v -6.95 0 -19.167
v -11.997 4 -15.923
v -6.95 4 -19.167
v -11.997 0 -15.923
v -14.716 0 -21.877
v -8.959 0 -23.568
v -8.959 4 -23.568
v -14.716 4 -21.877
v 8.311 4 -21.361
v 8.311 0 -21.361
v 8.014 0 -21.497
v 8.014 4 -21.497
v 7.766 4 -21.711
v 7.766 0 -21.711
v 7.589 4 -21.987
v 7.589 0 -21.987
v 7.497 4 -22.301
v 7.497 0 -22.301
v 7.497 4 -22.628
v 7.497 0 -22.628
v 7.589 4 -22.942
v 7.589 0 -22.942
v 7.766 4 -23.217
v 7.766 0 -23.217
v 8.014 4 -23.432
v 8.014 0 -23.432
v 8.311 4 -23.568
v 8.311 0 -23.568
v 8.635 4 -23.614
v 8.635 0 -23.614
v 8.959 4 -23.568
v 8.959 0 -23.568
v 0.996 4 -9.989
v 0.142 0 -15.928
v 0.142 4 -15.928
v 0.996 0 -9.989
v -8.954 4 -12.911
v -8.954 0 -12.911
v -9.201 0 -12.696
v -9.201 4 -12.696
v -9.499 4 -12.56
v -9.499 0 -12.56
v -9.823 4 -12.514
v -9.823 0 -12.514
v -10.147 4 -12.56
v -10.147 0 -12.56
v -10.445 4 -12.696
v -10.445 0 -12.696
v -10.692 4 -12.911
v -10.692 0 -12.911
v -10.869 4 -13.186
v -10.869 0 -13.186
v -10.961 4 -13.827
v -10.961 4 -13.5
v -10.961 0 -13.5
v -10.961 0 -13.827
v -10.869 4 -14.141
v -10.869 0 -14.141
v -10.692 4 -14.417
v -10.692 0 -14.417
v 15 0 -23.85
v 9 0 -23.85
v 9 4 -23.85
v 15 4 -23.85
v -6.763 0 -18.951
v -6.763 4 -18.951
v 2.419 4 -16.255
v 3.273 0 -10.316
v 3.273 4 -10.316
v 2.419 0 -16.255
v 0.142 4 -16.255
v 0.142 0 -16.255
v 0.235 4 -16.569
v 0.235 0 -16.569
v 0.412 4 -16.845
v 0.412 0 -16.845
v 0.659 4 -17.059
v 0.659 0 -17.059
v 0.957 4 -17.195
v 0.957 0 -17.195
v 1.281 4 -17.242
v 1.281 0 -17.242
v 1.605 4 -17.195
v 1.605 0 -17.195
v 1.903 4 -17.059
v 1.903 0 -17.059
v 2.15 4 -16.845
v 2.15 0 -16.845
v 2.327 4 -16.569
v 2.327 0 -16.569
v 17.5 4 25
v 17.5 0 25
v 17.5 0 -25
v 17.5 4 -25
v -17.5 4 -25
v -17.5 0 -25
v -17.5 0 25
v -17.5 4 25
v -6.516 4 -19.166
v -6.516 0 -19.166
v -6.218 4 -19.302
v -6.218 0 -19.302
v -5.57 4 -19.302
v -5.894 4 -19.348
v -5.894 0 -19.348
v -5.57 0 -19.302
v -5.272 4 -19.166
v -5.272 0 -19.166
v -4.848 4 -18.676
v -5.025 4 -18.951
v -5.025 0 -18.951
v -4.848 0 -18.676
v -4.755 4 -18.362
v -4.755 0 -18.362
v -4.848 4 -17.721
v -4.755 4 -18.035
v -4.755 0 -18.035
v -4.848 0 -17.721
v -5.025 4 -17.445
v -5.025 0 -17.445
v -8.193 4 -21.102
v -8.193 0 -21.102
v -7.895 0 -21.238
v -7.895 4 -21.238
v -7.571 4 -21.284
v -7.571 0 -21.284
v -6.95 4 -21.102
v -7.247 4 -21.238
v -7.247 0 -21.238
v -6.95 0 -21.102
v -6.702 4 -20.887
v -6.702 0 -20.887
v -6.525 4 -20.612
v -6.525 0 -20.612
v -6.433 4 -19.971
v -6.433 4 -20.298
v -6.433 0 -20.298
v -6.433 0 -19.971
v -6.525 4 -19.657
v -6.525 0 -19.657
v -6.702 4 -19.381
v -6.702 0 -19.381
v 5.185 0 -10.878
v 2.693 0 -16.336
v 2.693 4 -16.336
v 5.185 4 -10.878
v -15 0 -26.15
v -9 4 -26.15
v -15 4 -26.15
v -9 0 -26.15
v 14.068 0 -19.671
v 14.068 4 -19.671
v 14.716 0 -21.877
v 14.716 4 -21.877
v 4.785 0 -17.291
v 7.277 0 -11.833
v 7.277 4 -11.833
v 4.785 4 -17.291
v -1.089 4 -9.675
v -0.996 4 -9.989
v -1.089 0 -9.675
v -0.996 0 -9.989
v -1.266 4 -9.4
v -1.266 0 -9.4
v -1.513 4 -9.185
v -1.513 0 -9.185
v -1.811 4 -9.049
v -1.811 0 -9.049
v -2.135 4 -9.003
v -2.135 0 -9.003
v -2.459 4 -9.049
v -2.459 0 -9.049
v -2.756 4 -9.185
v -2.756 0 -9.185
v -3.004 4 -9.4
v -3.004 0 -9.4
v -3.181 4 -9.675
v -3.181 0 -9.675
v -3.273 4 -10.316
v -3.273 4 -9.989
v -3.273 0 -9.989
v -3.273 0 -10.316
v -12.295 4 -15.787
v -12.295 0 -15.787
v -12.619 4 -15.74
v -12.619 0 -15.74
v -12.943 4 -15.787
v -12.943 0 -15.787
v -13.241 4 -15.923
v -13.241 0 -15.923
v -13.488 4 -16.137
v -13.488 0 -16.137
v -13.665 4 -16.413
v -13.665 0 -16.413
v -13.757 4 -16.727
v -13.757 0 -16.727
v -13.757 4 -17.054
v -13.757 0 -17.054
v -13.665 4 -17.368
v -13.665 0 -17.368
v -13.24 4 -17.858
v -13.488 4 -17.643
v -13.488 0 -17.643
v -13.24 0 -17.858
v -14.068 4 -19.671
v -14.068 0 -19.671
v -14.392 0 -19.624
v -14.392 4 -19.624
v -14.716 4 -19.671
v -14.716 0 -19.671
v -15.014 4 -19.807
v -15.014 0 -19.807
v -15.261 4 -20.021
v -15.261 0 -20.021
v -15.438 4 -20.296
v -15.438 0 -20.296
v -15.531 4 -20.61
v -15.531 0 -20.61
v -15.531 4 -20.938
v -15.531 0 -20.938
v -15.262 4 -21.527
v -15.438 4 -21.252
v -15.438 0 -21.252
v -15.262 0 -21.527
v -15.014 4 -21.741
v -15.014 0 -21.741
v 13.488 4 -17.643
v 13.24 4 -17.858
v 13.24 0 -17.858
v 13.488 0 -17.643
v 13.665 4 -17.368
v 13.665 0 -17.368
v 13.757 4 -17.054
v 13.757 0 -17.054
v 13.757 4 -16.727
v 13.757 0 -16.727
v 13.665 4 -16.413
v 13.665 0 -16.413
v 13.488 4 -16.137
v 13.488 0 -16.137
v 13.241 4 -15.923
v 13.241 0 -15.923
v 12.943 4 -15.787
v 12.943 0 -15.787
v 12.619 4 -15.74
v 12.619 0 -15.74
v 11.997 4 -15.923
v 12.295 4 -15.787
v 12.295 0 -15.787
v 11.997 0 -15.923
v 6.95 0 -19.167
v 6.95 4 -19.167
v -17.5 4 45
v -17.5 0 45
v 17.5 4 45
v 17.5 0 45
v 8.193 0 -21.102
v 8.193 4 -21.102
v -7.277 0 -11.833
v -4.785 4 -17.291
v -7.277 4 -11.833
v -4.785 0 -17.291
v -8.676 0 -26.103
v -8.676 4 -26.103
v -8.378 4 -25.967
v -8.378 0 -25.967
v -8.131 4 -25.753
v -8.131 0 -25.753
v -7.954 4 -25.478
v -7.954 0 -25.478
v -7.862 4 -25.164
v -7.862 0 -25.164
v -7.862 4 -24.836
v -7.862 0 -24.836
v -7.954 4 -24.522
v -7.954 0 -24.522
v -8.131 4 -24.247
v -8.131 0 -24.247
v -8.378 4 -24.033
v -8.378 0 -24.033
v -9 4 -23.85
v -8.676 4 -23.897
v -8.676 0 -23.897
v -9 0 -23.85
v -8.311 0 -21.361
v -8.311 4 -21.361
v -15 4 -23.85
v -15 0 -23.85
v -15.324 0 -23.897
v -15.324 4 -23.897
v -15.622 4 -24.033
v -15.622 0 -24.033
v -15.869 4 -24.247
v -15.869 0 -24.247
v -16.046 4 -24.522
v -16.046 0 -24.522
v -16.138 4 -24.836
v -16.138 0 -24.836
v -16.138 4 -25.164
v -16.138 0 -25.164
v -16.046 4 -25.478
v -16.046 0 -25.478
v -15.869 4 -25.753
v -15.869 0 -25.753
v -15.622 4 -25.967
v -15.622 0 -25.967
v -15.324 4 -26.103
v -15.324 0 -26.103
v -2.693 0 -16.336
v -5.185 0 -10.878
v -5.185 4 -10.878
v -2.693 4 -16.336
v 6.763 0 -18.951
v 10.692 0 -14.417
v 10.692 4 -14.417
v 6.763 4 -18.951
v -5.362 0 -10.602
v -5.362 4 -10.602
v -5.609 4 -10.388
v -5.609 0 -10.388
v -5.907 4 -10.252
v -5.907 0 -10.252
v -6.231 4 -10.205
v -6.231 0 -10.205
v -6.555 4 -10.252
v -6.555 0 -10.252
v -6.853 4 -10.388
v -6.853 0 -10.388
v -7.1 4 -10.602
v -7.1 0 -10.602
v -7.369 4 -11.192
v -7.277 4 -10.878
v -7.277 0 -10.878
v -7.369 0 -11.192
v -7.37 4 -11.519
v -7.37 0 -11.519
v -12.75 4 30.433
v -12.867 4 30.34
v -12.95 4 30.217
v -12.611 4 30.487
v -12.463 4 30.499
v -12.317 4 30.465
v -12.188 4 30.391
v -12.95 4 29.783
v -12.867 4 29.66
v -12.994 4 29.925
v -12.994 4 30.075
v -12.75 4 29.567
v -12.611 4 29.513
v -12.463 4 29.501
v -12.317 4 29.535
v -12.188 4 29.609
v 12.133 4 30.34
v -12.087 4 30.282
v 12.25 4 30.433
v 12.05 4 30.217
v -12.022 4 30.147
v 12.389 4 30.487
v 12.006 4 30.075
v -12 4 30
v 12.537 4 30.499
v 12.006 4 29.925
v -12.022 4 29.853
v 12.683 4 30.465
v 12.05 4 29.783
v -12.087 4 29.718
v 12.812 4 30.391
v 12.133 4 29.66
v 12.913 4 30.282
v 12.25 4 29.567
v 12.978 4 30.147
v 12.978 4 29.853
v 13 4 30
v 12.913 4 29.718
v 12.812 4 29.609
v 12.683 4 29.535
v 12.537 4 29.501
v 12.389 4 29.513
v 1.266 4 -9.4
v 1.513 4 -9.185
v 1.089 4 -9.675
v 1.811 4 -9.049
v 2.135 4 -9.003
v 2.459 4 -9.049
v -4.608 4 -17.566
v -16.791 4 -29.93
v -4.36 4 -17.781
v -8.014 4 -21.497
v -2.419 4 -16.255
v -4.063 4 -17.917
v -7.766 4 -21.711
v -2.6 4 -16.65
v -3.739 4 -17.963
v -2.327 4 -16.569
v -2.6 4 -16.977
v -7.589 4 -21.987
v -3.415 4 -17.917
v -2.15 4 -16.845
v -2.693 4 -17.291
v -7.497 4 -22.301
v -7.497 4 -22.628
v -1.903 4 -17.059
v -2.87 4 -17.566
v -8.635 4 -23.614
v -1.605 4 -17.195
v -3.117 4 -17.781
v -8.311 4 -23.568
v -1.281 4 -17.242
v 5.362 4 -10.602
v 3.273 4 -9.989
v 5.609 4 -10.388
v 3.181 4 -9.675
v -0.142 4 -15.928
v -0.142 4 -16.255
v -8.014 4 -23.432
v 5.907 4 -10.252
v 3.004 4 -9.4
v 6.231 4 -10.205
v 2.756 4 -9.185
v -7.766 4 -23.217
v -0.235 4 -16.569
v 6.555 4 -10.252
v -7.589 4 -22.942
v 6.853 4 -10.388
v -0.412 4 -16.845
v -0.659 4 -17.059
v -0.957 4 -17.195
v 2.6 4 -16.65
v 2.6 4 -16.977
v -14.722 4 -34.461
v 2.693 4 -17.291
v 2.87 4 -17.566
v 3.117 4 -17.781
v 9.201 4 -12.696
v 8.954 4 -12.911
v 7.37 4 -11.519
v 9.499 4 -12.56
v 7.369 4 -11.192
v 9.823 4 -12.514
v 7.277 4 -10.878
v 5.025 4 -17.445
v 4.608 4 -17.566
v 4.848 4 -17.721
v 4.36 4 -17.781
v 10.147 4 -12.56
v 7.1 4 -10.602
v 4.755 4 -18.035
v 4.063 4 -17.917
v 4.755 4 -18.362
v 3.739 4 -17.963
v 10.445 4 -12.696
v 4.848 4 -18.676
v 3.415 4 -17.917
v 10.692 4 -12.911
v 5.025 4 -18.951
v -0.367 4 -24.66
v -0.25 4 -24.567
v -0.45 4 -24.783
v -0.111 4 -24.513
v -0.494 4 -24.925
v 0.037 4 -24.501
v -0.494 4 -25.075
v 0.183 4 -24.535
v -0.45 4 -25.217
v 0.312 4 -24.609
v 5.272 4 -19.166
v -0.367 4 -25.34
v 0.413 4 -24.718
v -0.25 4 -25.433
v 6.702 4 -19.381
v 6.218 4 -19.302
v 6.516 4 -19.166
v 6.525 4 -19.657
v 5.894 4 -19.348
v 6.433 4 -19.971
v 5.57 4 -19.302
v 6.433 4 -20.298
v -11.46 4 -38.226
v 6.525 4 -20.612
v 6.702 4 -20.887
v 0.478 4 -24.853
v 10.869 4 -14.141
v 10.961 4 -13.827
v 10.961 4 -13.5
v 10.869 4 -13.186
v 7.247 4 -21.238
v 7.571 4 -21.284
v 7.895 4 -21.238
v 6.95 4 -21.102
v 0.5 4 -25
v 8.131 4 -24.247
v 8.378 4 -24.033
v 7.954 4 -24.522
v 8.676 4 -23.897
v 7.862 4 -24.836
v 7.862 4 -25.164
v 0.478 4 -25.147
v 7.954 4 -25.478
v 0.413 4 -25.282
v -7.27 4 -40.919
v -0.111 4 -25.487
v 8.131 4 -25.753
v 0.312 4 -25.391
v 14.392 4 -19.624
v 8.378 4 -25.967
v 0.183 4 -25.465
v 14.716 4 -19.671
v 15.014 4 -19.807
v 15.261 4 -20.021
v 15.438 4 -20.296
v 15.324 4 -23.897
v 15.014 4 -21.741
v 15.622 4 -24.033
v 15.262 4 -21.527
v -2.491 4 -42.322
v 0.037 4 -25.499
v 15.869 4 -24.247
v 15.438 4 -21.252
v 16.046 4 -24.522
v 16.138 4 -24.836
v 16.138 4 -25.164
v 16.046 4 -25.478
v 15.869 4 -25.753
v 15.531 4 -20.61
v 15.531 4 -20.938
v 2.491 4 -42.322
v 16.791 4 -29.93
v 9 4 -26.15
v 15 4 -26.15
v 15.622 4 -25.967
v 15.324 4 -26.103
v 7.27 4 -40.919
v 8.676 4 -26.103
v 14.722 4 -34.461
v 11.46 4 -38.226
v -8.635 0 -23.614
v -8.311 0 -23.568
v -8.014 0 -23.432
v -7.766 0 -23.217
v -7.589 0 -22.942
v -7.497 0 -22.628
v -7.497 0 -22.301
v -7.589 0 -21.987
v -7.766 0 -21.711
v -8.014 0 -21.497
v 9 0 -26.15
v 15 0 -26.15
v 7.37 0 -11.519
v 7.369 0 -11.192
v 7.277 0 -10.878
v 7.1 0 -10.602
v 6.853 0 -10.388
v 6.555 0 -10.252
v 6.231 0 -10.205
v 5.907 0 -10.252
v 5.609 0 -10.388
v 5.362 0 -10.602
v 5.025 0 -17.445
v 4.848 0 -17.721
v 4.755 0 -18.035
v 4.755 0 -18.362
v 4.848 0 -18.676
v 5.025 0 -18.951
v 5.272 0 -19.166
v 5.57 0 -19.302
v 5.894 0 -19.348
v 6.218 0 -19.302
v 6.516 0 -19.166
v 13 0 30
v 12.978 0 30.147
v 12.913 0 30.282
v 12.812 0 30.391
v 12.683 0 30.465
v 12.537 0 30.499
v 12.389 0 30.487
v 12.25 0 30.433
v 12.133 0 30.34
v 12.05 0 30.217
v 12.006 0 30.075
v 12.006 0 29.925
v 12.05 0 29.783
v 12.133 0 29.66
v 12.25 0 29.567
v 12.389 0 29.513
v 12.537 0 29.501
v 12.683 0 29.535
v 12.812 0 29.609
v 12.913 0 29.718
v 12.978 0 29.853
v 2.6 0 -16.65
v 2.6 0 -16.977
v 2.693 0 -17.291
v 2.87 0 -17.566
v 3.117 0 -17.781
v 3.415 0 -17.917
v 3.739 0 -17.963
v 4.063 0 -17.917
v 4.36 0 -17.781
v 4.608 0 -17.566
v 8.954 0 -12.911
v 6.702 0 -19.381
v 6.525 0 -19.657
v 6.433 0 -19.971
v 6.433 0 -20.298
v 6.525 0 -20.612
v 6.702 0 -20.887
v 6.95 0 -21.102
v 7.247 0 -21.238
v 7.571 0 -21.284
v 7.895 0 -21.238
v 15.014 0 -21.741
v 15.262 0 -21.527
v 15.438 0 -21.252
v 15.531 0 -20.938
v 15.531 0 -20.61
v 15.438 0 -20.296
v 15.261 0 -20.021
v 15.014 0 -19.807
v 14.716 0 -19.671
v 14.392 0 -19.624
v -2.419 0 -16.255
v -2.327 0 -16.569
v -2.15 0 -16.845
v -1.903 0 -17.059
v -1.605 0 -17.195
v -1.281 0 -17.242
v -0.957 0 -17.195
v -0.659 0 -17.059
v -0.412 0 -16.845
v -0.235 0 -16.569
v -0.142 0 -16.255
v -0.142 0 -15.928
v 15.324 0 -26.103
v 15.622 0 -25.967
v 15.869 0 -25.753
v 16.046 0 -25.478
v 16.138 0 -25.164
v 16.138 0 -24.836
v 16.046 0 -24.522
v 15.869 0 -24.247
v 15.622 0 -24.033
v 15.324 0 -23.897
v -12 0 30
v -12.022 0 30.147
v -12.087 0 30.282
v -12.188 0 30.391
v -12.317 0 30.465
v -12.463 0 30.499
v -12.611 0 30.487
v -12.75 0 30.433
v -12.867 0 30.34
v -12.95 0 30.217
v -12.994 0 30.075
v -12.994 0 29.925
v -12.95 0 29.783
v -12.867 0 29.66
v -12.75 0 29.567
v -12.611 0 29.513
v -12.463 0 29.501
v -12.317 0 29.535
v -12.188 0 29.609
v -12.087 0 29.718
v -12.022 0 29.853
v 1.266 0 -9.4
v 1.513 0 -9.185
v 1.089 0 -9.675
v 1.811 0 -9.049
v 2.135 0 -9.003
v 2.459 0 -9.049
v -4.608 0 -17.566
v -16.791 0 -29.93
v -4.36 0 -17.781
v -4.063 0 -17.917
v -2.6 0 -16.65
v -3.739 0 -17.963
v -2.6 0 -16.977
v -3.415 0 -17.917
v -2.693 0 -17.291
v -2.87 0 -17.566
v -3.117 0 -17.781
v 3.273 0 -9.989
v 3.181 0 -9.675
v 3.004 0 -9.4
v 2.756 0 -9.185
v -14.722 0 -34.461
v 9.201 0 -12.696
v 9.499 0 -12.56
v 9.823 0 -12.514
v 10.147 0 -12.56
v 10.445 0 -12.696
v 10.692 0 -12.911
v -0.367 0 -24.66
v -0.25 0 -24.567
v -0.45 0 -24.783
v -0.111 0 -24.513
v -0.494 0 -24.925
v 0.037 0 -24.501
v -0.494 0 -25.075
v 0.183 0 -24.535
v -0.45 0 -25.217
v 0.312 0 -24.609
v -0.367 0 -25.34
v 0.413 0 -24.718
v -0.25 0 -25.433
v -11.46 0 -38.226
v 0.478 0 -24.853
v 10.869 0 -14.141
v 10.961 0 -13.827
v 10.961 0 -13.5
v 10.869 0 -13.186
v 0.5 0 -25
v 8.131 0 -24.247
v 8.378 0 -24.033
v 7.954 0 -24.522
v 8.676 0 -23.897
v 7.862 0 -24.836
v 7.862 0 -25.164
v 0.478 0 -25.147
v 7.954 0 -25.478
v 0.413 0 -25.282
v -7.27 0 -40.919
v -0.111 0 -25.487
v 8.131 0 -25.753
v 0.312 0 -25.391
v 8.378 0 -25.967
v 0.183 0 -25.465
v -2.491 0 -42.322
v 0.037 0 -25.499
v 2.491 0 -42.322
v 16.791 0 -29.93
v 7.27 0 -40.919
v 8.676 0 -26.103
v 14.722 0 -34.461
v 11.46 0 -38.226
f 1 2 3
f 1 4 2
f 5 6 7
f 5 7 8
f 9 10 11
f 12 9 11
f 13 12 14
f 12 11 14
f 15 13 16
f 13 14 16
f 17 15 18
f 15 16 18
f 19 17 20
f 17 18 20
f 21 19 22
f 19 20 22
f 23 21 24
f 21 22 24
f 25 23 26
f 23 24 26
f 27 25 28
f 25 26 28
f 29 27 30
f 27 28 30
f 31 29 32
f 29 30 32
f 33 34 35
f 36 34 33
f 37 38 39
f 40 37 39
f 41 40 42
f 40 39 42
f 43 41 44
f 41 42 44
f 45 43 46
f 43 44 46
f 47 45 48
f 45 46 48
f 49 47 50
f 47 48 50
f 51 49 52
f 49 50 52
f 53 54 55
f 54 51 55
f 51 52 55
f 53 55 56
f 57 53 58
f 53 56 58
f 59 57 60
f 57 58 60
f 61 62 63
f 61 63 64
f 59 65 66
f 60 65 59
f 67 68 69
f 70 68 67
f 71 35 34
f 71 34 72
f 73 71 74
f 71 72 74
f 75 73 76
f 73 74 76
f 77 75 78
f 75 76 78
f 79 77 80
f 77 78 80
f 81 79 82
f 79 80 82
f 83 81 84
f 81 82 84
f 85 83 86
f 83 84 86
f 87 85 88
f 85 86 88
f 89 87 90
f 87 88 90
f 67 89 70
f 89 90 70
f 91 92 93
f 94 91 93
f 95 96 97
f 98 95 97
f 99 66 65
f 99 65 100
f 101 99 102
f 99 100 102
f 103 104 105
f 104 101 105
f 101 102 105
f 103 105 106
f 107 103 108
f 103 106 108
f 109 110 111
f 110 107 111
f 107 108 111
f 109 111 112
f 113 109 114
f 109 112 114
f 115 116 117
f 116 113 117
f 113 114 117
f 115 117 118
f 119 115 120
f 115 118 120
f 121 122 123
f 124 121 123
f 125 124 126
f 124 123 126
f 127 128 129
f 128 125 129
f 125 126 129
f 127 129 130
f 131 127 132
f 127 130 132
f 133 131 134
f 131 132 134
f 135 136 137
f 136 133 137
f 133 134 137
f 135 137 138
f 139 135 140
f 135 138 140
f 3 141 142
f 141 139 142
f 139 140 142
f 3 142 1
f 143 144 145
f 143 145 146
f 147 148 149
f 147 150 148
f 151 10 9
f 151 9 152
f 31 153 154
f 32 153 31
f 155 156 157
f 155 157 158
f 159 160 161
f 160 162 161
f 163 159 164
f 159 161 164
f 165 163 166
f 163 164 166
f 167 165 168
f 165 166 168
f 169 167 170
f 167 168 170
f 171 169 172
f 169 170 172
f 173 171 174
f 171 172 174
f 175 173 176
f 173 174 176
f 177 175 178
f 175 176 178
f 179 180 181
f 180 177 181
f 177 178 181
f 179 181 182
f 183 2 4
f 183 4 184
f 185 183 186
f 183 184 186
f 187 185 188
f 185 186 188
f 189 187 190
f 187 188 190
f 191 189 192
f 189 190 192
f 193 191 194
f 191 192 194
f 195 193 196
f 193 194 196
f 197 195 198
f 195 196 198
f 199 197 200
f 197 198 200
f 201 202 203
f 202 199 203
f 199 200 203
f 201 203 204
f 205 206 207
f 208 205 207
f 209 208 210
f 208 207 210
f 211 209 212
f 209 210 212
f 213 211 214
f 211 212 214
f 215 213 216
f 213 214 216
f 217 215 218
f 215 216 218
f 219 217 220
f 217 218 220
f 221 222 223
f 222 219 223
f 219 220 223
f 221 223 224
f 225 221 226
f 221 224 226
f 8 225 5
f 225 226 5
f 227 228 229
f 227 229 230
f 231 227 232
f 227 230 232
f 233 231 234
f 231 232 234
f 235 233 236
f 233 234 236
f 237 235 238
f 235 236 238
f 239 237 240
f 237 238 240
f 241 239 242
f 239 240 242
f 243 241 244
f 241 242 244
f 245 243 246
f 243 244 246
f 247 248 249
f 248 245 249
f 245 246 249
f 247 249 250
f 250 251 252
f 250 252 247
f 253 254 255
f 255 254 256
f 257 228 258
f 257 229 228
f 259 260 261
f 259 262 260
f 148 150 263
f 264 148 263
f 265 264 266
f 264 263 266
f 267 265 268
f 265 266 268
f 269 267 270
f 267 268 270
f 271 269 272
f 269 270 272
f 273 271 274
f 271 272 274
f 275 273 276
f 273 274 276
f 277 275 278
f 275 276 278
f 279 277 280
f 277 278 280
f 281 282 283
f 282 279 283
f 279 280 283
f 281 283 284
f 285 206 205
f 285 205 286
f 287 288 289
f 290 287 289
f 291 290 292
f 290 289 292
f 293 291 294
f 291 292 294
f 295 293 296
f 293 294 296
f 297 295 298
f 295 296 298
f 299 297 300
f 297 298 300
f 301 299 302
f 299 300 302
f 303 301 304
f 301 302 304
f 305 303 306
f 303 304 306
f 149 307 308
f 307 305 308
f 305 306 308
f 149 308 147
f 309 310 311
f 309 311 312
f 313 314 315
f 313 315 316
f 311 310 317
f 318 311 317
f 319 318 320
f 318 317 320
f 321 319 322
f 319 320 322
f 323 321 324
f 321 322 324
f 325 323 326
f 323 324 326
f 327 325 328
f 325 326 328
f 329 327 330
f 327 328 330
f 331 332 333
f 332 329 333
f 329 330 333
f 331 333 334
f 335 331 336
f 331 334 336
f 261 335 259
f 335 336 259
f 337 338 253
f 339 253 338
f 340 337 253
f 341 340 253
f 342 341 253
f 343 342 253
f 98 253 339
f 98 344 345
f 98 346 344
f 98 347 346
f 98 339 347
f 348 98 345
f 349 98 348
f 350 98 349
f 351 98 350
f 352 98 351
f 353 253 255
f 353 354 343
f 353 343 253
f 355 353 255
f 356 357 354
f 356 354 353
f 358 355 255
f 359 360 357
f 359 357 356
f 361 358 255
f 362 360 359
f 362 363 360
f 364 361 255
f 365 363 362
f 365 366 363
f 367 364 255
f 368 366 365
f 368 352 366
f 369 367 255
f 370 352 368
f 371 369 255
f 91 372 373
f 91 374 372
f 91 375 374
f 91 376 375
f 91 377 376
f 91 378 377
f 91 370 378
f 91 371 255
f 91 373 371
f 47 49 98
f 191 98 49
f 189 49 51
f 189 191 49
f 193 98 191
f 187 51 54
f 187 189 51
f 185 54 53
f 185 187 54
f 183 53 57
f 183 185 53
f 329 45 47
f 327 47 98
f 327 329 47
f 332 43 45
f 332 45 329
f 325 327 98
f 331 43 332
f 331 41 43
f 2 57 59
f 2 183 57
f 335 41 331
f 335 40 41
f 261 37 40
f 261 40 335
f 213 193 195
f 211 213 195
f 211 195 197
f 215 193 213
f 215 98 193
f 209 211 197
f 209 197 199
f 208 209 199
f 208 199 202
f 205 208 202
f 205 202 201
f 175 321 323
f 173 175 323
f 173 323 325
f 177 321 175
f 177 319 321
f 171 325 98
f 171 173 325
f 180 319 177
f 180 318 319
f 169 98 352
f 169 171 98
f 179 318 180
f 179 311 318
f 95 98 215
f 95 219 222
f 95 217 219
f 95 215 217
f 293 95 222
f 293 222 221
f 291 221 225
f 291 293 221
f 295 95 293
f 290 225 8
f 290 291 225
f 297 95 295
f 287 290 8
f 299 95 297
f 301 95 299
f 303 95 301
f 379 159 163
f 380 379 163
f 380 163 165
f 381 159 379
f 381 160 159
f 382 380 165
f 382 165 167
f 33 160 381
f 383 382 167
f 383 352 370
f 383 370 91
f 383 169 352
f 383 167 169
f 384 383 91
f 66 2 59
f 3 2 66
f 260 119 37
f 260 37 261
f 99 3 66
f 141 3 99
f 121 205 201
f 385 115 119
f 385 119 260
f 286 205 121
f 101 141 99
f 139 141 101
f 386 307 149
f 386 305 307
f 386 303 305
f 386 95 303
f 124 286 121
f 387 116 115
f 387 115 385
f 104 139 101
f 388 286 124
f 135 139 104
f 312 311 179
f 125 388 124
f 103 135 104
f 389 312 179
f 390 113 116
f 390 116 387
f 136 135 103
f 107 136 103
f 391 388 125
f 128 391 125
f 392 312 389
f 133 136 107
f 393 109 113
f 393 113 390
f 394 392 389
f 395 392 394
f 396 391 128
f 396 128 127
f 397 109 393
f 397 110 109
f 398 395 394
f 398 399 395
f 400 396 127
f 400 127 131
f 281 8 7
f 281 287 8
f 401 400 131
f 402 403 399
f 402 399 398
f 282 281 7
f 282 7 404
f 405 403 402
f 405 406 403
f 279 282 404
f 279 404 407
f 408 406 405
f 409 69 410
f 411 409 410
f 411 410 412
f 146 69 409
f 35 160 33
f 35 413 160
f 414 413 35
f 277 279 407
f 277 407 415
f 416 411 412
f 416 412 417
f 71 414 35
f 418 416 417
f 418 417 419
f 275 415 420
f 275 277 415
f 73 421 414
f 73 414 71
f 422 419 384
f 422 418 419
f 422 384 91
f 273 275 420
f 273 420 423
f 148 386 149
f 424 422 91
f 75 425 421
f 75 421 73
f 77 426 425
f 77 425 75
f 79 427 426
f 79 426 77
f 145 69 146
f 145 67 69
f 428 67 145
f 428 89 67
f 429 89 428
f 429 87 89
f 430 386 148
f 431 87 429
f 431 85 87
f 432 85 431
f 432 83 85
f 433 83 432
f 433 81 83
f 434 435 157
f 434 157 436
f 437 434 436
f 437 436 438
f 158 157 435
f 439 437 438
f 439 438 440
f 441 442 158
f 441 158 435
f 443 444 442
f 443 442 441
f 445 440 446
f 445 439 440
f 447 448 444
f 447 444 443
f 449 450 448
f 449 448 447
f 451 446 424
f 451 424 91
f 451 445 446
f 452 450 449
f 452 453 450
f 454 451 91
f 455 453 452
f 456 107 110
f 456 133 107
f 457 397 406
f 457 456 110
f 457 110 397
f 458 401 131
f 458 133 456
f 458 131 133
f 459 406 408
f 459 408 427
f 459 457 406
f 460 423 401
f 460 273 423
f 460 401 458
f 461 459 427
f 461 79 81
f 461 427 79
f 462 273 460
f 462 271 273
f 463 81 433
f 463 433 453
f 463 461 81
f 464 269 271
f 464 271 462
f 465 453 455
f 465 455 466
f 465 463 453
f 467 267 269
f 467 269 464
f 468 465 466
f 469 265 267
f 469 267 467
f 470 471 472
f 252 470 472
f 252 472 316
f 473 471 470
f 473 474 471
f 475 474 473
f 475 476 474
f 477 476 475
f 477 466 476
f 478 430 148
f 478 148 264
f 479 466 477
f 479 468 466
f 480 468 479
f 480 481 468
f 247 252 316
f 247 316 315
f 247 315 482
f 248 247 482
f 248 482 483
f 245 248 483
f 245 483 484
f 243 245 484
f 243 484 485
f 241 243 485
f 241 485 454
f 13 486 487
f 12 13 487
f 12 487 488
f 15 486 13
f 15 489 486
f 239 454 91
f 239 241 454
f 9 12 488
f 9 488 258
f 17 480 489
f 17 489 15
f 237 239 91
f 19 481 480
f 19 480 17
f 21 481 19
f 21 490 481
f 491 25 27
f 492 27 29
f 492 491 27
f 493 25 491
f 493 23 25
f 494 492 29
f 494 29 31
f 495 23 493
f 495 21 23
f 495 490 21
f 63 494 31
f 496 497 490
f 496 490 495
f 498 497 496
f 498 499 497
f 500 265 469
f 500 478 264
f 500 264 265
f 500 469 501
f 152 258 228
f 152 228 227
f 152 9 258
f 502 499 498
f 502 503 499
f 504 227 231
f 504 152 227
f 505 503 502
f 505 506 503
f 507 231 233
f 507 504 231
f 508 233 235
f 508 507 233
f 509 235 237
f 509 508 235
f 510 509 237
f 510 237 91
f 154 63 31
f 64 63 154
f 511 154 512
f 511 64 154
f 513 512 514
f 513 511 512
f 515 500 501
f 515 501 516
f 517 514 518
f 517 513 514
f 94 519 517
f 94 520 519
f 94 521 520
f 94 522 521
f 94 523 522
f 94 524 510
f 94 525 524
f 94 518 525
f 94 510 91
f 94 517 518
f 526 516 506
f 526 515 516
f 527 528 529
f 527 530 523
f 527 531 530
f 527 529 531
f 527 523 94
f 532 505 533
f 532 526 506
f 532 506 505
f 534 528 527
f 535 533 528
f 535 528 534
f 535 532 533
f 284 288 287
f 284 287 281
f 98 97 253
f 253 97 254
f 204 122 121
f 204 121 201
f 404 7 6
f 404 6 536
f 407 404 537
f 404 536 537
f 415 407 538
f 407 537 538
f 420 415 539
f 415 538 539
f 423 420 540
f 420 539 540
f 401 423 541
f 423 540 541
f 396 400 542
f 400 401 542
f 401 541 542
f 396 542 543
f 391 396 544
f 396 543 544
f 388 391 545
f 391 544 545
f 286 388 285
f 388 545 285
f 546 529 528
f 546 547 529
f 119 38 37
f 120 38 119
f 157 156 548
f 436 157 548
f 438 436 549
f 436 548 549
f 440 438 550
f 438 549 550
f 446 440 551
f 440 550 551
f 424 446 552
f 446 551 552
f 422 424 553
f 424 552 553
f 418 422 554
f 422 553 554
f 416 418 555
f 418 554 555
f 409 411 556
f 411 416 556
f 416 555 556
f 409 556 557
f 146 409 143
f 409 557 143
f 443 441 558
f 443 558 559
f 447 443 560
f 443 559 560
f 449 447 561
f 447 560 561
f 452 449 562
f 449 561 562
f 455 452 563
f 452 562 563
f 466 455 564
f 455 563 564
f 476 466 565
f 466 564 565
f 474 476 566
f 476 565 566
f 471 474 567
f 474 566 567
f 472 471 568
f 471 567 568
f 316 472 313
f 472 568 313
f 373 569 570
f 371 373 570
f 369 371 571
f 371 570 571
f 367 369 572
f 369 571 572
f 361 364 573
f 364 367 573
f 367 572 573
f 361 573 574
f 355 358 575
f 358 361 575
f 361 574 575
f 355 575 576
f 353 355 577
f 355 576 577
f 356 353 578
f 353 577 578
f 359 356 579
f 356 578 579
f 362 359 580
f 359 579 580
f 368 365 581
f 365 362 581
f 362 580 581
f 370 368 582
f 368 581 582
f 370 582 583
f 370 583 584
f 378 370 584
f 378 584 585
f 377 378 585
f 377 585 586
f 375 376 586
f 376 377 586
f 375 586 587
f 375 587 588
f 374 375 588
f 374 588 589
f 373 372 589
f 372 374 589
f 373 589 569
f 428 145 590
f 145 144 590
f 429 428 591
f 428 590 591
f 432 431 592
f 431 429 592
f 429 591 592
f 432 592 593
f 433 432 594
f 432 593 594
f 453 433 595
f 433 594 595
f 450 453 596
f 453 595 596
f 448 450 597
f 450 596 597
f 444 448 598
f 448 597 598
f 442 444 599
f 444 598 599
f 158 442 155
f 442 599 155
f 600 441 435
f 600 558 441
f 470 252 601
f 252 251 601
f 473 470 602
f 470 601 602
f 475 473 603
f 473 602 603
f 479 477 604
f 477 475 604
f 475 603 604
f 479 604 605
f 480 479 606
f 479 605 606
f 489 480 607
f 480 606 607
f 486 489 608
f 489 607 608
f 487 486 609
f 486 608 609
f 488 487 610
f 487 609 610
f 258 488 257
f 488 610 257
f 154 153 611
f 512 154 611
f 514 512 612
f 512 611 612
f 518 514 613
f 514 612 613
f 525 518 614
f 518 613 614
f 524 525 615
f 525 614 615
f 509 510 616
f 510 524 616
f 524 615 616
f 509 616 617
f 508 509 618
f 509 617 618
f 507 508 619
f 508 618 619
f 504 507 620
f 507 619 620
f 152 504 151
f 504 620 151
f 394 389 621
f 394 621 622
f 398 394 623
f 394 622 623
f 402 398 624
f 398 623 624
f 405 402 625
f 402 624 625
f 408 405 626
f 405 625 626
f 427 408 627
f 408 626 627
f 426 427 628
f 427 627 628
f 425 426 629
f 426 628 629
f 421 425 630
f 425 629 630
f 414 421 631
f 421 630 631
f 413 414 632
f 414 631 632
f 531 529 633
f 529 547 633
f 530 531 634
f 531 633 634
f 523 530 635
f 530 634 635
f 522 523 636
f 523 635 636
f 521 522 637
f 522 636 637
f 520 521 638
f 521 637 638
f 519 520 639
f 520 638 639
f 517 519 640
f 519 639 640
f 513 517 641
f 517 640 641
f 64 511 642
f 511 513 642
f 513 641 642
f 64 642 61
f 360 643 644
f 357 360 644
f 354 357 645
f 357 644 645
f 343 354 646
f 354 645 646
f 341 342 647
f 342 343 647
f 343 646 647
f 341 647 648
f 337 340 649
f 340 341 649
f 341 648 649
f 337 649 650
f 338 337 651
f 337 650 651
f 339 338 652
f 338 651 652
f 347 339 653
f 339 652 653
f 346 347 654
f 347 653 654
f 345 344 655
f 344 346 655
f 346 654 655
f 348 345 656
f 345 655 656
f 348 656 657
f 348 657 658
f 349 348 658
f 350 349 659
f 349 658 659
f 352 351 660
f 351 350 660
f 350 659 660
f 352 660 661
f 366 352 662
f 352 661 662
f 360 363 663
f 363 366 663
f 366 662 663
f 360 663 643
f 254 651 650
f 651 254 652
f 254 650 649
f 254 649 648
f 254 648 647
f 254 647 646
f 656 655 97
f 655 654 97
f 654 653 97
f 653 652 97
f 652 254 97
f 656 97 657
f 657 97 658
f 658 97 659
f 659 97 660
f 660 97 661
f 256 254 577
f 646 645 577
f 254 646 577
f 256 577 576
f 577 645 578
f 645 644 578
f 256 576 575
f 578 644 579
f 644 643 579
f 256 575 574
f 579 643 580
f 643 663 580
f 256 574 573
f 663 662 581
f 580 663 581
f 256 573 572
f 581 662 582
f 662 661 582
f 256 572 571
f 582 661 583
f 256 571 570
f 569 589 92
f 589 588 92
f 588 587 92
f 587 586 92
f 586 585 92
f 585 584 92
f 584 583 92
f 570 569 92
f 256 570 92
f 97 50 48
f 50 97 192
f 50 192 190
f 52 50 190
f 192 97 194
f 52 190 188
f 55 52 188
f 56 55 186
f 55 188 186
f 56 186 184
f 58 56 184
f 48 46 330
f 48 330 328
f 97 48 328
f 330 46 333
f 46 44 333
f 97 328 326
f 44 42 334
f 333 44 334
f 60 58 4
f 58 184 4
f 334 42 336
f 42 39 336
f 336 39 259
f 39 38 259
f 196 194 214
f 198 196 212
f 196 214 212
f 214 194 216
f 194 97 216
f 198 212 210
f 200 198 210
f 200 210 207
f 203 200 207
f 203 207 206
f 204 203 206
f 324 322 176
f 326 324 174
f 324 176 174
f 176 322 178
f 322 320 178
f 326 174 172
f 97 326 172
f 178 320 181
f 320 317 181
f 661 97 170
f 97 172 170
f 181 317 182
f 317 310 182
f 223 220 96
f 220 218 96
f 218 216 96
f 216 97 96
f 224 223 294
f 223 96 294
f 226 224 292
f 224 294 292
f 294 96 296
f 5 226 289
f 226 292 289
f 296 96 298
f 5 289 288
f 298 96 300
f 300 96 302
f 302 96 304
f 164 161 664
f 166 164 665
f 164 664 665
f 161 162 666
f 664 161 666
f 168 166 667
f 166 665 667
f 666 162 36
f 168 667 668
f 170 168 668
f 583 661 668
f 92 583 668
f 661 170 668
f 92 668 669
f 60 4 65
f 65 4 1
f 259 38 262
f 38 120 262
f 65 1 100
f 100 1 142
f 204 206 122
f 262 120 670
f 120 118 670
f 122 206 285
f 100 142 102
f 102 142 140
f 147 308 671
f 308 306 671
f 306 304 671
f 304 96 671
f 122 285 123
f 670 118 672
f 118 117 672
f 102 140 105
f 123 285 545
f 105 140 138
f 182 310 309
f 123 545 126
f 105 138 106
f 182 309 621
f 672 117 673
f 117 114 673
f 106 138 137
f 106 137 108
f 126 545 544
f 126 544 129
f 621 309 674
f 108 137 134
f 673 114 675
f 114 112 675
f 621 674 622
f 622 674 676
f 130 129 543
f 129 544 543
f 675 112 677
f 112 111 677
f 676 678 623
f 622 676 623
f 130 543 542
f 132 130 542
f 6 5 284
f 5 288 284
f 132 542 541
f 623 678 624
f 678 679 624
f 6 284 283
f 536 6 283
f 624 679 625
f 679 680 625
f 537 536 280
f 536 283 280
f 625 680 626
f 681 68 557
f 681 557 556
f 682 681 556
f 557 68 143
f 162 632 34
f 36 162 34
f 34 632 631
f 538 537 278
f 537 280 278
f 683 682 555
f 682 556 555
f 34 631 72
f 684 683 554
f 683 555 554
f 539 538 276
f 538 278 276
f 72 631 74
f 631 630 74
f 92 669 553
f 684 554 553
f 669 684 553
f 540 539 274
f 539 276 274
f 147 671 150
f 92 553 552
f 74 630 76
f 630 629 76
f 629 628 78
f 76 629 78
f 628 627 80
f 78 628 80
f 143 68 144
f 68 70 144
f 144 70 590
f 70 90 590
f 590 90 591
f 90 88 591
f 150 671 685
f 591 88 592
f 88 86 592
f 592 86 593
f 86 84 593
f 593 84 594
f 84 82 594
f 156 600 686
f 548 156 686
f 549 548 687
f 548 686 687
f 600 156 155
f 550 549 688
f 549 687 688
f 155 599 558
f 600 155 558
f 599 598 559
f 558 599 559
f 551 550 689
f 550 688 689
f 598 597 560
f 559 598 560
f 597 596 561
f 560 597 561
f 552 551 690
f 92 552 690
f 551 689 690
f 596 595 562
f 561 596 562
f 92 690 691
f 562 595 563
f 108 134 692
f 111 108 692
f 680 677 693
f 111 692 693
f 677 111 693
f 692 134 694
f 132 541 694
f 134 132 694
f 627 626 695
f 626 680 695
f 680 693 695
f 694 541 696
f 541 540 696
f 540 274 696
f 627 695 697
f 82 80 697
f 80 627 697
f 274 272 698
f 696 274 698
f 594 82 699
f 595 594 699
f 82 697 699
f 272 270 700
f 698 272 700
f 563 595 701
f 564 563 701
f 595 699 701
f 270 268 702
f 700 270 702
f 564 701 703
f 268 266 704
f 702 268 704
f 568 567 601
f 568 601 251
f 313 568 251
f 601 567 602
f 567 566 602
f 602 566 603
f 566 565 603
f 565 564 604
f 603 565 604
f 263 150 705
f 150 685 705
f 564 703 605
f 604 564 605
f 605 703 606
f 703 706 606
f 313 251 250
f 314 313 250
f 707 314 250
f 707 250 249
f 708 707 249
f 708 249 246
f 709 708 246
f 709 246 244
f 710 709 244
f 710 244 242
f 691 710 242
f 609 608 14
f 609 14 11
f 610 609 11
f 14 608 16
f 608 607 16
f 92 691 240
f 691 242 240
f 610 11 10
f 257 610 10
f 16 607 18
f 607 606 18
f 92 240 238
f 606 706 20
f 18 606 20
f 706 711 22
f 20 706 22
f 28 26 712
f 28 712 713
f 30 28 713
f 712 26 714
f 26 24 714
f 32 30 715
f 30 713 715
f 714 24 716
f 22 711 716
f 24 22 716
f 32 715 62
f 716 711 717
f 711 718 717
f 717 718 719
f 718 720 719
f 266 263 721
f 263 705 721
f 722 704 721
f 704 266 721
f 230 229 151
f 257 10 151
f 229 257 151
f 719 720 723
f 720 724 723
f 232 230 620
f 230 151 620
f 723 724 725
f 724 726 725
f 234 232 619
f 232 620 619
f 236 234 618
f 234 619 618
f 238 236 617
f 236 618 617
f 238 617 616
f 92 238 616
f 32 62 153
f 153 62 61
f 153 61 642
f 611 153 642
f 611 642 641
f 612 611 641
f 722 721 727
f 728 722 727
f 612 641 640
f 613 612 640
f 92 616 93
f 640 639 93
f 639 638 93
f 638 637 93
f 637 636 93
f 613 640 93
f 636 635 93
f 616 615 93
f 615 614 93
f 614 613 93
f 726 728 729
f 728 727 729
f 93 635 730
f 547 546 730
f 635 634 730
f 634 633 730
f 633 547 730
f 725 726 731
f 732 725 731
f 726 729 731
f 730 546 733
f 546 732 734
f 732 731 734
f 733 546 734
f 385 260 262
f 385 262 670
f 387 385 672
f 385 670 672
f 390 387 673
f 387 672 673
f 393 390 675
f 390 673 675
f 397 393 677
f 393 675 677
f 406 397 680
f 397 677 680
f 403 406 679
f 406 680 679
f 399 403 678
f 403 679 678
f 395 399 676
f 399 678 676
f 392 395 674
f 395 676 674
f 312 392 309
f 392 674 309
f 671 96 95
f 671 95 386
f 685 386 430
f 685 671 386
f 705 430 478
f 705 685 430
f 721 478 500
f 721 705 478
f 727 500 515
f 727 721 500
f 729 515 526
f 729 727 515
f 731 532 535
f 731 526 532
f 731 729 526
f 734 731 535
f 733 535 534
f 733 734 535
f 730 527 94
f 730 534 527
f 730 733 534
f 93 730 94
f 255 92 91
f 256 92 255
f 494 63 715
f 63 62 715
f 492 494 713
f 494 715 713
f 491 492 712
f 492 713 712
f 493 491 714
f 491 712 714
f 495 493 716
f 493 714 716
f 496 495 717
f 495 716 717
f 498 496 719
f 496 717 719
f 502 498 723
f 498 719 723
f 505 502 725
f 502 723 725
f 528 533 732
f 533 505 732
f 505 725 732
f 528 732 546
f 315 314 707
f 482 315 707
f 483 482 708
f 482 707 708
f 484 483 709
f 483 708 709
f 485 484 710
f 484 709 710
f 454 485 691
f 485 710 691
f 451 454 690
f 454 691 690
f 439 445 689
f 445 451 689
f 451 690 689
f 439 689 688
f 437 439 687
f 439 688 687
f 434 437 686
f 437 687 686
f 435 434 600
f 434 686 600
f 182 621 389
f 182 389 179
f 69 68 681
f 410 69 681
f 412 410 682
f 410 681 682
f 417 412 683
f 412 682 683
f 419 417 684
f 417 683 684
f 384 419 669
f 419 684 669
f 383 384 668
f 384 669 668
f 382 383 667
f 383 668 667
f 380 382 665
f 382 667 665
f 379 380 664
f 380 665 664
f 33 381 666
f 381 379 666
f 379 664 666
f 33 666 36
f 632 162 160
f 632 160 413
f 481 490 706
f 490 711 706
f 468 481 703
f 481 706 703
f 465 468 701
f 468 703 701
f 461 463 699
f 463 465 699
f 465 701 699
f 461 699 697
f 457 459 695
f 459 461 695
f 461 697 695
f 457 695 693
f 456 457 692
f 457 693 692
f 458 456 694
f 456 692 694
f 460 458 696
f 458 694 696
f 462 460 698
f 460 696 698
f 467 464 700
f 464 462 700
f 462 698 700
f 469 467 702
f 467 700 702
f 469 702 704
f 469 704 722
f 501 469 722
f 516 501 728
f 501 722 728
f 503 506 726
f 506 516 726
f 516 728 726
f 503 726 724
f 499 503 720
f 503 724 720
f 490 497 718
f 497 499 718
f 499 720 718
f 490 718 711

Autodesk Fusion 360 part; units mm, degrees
sketch "Sketch1" plane through (0, 0, 0) normal (0, 1, 0) x (1, 0, 0)
  line L0 (-17.5, 25) -> (-17.5, -25)
  line L1 (17.5, -25) -> (17.5, 25)
  circle A0 centre (0, 25) radius 0.5
  arc A1 (17.5, 25) -> (-17.5, 25) centre (0, 25) ccw
  line L2 (-15, 23.85) -> (-9, 23.85)
  arc A2 (-9, 23.85) -> (-9, 26.15) centre (-9, 25) ccw
  line L3 (-9, 26.15) -> (-15, 26.15)
  arc A3 (-15, 26.15) -> (-15, 23.85) centre (-15, 25) ccw
  line L4 (-15, 25) -> (-9, 25) construction
  circle A4 centre (-12.5, -30) radius 0.5
  circle A5 centre (12.5, -30) radius 0.5
  line L5 (-17.5, -25) -> (-17.5, -45)
  line L6 (-17.5, -45) -> (17.5, -45)
  line L7 (17.5, -25) -> (17.5, -45)
  arc A6 (-14.7164, 21.8774) -> (-14.0684, 19.6706) centre (-14.3924, 20.774) ccw
  arc A7 (-8.3114, 21.361) -> (-8.9594, 23.5678) centre (-8.6354, 22.4644) ccw
  line L8 (-14.0684, 19.6706) -> (-8.3114, 21.361)
  line L9 (-8.9594, 23.5678) -> (-14.7164, 21.8774)
  line L10 (-14.3924, 20.774) -> (-8.6354, 22.4644) construction
  arc A8 (-13.2405, 17.8578) -> (-11.9971, 15.9229) centre (-12.6188, 16.8904) ccw
  arc A9 (-6.9495, 19.1668) -> (-8.193, 21.1017) centre (-7.5713, 20.1342) ccw
  line L11 (-11.9971, 15.9229) -> (-6.9495, 19.1668)
  line L12 (-8.193, 21.1017) -> (-13.2405, 17.8578)
  line L13 (-12.6188, 16.8904) -> (-7.5713, 20.1342) construction
  arc A10 (-10.692, 14.4168) -> (-8.9538, 12.9107) centre (-9.8229, 13.6638) ccw
  arc A11 (-5.0246, 17.4452) -> (-6.7629, 18.9513) centre (-5.8937, 18.1983) ccw
  line L14 (-8.9538, 12.9107) -> (-5.0246, 17.4452)
  line L15 (-6.7629, 18.9513) -> (-10.692, 14.4168)
  line L16 (-9.8229, 13.6638) -> (-5.8937, 18.1983) construction
  arc A12 (-7.2773, 11.8332) -> (-5.1851, 10.8778) centre (-6.2312, 11.3555) ccw
  arc A13 (-2.6927, 16.3356) -> (-4.7848, 17.291) centre (-3.7387, 16.8133) ccw
  line L17 (-5.1851, 10.8778) -> (-2.6927, 16.3356)
  line L18 (-4.7848, 17.291) -> (-7.2773, 11.8332)
  line L19 (-6.2312, 11.3555) -> (-3.7387, 16.8133) construction
  arc A14 (-3.273, 10.3163) -> (-0.9964, 9.989) centre (-2.1347, 10.1527) ccw
  arc A15 (-0.1425, 15.9279) -> (-2.4191, 16.2553) centre (-1.2808, 16.0916) ccw
  line L20 (-0.9964, 9.989) -> (-0.1425, 15.9279)
  line L21 (-2.4191, 16.2553) -> (-3.273, 10.3163)
  line L22 (-2.1347, 10.1527) -> (-1.2808, 16.0916) construction
  arc A16 (0.9964, 9.989) -> (3.273, 10.3163) centre (2.1347, 10.1527) ccw
  arc A17 (2.4191, 16.2553) -> (0.1425, 15.9279) centre (1.2808, 16.0916) ccw
  line L23 (3.273, 10.3163) -> (2.4191, 16.2553)
  line L24 (0.1425, 15.9279) -> (0.9964, 9.989)
  line L25 (2.1347, 10.1527) -> (1.2808, 16.0916) construction
  arc A18 (5.1851, 10.8778) -> (7.2773, 11.8332) centre (6.2312, 11.3555) ccw
  arc A19 (4.7848, 17.291) -> (2.6927, 16.3356) centre (3.7387, 16.8133) ccw
  line L26 (7.2773, 11.8332) -> (4.7848, 17.291)
  line L27 (2.6927, 16.3356) -> (5.1851, 10.8778)
  line L28 (6.2312, 11.3555) -> (3.7387, 16.8133) construction
  arc A20 (8.9538, 12.9107) -> (10.692, 14.4168) centre (9.8229, 13.6638) ccw
  arc A21 (6.7629, 18.9513) -> (5.0246, 17.4452) centre (5.8937, 18.1983) ccw
  line L29 (10.692, 14.4168) -> (6.7629, 18.9513)
  line L30 (5.0246, 17.4452) -> (8.9538, 12.9107)
  line L31 (9.8229, 13.6638) -> (5.8937, 18.1983) construction
  arc A22 (11.9971, 15.9229) -> (13.2405, 17.8578) centre (12.6188, 16.8904) ccw
  arc A23 (8.193, 21.1017) -> (6.9495, 19.1668) centre (7.5713, 20.1342) ccw
  line L32 (13.2405, 17.8578) -> (8.193, 21.1017)
  line L33 (6.9495, 19.1668) -> (11.9971, 15.9229)
  line L34 (12.6188, 16.8904) -> (7.5713, 20.1342) construction
  arc A24 (14.0684, 19.6706) -> (14.7164, 21.8774) centre (14.3924, 20.774) ccw
  arc A25 (8.9594, 23.5678) -> (8.3114, 21.361) centre (8.6354, 22.4644) ccw
  line L35 (14.7164, 21.8774) -> (8.9594, 23.5678)
  line L36 (8.3114, 21.361) -> (14.0684, 19.6706)
  line L37 (14.3924, 20.774) -> (8.6354, 22.4644) construction
  arc A26 (15, 23.85) -> (15, 26.15) centre (15, 25) ccw
  arc A27 (9, 26.15) -> (9, 23.85) centre (9, 25) ccw
  line L38 (15, 26.15) -> (9, 26.15)
  line L39 (9, 23.85) -> (15, 23.85)
  line L40 (15, 25) -> (9, 25) construction
  dimension "d1" = 50
  dimension "d2" = 35
  dimension "d4" = 1
  dimension "d7" = 15
  dimension "d31" = 2.3
  dimension "d45" = 1
  dimension "d46" = 1
  dimension "d49" = 5
  dimension "d50" = 5
  dimension "d52" = 20
  dimension "d54" = 15
  dimension "d55" = 15
  dimension "d58" = 6
  dimension "d62" = 180
extrude "Extrude4" add sketch "Sketch1" along normal blind 4
